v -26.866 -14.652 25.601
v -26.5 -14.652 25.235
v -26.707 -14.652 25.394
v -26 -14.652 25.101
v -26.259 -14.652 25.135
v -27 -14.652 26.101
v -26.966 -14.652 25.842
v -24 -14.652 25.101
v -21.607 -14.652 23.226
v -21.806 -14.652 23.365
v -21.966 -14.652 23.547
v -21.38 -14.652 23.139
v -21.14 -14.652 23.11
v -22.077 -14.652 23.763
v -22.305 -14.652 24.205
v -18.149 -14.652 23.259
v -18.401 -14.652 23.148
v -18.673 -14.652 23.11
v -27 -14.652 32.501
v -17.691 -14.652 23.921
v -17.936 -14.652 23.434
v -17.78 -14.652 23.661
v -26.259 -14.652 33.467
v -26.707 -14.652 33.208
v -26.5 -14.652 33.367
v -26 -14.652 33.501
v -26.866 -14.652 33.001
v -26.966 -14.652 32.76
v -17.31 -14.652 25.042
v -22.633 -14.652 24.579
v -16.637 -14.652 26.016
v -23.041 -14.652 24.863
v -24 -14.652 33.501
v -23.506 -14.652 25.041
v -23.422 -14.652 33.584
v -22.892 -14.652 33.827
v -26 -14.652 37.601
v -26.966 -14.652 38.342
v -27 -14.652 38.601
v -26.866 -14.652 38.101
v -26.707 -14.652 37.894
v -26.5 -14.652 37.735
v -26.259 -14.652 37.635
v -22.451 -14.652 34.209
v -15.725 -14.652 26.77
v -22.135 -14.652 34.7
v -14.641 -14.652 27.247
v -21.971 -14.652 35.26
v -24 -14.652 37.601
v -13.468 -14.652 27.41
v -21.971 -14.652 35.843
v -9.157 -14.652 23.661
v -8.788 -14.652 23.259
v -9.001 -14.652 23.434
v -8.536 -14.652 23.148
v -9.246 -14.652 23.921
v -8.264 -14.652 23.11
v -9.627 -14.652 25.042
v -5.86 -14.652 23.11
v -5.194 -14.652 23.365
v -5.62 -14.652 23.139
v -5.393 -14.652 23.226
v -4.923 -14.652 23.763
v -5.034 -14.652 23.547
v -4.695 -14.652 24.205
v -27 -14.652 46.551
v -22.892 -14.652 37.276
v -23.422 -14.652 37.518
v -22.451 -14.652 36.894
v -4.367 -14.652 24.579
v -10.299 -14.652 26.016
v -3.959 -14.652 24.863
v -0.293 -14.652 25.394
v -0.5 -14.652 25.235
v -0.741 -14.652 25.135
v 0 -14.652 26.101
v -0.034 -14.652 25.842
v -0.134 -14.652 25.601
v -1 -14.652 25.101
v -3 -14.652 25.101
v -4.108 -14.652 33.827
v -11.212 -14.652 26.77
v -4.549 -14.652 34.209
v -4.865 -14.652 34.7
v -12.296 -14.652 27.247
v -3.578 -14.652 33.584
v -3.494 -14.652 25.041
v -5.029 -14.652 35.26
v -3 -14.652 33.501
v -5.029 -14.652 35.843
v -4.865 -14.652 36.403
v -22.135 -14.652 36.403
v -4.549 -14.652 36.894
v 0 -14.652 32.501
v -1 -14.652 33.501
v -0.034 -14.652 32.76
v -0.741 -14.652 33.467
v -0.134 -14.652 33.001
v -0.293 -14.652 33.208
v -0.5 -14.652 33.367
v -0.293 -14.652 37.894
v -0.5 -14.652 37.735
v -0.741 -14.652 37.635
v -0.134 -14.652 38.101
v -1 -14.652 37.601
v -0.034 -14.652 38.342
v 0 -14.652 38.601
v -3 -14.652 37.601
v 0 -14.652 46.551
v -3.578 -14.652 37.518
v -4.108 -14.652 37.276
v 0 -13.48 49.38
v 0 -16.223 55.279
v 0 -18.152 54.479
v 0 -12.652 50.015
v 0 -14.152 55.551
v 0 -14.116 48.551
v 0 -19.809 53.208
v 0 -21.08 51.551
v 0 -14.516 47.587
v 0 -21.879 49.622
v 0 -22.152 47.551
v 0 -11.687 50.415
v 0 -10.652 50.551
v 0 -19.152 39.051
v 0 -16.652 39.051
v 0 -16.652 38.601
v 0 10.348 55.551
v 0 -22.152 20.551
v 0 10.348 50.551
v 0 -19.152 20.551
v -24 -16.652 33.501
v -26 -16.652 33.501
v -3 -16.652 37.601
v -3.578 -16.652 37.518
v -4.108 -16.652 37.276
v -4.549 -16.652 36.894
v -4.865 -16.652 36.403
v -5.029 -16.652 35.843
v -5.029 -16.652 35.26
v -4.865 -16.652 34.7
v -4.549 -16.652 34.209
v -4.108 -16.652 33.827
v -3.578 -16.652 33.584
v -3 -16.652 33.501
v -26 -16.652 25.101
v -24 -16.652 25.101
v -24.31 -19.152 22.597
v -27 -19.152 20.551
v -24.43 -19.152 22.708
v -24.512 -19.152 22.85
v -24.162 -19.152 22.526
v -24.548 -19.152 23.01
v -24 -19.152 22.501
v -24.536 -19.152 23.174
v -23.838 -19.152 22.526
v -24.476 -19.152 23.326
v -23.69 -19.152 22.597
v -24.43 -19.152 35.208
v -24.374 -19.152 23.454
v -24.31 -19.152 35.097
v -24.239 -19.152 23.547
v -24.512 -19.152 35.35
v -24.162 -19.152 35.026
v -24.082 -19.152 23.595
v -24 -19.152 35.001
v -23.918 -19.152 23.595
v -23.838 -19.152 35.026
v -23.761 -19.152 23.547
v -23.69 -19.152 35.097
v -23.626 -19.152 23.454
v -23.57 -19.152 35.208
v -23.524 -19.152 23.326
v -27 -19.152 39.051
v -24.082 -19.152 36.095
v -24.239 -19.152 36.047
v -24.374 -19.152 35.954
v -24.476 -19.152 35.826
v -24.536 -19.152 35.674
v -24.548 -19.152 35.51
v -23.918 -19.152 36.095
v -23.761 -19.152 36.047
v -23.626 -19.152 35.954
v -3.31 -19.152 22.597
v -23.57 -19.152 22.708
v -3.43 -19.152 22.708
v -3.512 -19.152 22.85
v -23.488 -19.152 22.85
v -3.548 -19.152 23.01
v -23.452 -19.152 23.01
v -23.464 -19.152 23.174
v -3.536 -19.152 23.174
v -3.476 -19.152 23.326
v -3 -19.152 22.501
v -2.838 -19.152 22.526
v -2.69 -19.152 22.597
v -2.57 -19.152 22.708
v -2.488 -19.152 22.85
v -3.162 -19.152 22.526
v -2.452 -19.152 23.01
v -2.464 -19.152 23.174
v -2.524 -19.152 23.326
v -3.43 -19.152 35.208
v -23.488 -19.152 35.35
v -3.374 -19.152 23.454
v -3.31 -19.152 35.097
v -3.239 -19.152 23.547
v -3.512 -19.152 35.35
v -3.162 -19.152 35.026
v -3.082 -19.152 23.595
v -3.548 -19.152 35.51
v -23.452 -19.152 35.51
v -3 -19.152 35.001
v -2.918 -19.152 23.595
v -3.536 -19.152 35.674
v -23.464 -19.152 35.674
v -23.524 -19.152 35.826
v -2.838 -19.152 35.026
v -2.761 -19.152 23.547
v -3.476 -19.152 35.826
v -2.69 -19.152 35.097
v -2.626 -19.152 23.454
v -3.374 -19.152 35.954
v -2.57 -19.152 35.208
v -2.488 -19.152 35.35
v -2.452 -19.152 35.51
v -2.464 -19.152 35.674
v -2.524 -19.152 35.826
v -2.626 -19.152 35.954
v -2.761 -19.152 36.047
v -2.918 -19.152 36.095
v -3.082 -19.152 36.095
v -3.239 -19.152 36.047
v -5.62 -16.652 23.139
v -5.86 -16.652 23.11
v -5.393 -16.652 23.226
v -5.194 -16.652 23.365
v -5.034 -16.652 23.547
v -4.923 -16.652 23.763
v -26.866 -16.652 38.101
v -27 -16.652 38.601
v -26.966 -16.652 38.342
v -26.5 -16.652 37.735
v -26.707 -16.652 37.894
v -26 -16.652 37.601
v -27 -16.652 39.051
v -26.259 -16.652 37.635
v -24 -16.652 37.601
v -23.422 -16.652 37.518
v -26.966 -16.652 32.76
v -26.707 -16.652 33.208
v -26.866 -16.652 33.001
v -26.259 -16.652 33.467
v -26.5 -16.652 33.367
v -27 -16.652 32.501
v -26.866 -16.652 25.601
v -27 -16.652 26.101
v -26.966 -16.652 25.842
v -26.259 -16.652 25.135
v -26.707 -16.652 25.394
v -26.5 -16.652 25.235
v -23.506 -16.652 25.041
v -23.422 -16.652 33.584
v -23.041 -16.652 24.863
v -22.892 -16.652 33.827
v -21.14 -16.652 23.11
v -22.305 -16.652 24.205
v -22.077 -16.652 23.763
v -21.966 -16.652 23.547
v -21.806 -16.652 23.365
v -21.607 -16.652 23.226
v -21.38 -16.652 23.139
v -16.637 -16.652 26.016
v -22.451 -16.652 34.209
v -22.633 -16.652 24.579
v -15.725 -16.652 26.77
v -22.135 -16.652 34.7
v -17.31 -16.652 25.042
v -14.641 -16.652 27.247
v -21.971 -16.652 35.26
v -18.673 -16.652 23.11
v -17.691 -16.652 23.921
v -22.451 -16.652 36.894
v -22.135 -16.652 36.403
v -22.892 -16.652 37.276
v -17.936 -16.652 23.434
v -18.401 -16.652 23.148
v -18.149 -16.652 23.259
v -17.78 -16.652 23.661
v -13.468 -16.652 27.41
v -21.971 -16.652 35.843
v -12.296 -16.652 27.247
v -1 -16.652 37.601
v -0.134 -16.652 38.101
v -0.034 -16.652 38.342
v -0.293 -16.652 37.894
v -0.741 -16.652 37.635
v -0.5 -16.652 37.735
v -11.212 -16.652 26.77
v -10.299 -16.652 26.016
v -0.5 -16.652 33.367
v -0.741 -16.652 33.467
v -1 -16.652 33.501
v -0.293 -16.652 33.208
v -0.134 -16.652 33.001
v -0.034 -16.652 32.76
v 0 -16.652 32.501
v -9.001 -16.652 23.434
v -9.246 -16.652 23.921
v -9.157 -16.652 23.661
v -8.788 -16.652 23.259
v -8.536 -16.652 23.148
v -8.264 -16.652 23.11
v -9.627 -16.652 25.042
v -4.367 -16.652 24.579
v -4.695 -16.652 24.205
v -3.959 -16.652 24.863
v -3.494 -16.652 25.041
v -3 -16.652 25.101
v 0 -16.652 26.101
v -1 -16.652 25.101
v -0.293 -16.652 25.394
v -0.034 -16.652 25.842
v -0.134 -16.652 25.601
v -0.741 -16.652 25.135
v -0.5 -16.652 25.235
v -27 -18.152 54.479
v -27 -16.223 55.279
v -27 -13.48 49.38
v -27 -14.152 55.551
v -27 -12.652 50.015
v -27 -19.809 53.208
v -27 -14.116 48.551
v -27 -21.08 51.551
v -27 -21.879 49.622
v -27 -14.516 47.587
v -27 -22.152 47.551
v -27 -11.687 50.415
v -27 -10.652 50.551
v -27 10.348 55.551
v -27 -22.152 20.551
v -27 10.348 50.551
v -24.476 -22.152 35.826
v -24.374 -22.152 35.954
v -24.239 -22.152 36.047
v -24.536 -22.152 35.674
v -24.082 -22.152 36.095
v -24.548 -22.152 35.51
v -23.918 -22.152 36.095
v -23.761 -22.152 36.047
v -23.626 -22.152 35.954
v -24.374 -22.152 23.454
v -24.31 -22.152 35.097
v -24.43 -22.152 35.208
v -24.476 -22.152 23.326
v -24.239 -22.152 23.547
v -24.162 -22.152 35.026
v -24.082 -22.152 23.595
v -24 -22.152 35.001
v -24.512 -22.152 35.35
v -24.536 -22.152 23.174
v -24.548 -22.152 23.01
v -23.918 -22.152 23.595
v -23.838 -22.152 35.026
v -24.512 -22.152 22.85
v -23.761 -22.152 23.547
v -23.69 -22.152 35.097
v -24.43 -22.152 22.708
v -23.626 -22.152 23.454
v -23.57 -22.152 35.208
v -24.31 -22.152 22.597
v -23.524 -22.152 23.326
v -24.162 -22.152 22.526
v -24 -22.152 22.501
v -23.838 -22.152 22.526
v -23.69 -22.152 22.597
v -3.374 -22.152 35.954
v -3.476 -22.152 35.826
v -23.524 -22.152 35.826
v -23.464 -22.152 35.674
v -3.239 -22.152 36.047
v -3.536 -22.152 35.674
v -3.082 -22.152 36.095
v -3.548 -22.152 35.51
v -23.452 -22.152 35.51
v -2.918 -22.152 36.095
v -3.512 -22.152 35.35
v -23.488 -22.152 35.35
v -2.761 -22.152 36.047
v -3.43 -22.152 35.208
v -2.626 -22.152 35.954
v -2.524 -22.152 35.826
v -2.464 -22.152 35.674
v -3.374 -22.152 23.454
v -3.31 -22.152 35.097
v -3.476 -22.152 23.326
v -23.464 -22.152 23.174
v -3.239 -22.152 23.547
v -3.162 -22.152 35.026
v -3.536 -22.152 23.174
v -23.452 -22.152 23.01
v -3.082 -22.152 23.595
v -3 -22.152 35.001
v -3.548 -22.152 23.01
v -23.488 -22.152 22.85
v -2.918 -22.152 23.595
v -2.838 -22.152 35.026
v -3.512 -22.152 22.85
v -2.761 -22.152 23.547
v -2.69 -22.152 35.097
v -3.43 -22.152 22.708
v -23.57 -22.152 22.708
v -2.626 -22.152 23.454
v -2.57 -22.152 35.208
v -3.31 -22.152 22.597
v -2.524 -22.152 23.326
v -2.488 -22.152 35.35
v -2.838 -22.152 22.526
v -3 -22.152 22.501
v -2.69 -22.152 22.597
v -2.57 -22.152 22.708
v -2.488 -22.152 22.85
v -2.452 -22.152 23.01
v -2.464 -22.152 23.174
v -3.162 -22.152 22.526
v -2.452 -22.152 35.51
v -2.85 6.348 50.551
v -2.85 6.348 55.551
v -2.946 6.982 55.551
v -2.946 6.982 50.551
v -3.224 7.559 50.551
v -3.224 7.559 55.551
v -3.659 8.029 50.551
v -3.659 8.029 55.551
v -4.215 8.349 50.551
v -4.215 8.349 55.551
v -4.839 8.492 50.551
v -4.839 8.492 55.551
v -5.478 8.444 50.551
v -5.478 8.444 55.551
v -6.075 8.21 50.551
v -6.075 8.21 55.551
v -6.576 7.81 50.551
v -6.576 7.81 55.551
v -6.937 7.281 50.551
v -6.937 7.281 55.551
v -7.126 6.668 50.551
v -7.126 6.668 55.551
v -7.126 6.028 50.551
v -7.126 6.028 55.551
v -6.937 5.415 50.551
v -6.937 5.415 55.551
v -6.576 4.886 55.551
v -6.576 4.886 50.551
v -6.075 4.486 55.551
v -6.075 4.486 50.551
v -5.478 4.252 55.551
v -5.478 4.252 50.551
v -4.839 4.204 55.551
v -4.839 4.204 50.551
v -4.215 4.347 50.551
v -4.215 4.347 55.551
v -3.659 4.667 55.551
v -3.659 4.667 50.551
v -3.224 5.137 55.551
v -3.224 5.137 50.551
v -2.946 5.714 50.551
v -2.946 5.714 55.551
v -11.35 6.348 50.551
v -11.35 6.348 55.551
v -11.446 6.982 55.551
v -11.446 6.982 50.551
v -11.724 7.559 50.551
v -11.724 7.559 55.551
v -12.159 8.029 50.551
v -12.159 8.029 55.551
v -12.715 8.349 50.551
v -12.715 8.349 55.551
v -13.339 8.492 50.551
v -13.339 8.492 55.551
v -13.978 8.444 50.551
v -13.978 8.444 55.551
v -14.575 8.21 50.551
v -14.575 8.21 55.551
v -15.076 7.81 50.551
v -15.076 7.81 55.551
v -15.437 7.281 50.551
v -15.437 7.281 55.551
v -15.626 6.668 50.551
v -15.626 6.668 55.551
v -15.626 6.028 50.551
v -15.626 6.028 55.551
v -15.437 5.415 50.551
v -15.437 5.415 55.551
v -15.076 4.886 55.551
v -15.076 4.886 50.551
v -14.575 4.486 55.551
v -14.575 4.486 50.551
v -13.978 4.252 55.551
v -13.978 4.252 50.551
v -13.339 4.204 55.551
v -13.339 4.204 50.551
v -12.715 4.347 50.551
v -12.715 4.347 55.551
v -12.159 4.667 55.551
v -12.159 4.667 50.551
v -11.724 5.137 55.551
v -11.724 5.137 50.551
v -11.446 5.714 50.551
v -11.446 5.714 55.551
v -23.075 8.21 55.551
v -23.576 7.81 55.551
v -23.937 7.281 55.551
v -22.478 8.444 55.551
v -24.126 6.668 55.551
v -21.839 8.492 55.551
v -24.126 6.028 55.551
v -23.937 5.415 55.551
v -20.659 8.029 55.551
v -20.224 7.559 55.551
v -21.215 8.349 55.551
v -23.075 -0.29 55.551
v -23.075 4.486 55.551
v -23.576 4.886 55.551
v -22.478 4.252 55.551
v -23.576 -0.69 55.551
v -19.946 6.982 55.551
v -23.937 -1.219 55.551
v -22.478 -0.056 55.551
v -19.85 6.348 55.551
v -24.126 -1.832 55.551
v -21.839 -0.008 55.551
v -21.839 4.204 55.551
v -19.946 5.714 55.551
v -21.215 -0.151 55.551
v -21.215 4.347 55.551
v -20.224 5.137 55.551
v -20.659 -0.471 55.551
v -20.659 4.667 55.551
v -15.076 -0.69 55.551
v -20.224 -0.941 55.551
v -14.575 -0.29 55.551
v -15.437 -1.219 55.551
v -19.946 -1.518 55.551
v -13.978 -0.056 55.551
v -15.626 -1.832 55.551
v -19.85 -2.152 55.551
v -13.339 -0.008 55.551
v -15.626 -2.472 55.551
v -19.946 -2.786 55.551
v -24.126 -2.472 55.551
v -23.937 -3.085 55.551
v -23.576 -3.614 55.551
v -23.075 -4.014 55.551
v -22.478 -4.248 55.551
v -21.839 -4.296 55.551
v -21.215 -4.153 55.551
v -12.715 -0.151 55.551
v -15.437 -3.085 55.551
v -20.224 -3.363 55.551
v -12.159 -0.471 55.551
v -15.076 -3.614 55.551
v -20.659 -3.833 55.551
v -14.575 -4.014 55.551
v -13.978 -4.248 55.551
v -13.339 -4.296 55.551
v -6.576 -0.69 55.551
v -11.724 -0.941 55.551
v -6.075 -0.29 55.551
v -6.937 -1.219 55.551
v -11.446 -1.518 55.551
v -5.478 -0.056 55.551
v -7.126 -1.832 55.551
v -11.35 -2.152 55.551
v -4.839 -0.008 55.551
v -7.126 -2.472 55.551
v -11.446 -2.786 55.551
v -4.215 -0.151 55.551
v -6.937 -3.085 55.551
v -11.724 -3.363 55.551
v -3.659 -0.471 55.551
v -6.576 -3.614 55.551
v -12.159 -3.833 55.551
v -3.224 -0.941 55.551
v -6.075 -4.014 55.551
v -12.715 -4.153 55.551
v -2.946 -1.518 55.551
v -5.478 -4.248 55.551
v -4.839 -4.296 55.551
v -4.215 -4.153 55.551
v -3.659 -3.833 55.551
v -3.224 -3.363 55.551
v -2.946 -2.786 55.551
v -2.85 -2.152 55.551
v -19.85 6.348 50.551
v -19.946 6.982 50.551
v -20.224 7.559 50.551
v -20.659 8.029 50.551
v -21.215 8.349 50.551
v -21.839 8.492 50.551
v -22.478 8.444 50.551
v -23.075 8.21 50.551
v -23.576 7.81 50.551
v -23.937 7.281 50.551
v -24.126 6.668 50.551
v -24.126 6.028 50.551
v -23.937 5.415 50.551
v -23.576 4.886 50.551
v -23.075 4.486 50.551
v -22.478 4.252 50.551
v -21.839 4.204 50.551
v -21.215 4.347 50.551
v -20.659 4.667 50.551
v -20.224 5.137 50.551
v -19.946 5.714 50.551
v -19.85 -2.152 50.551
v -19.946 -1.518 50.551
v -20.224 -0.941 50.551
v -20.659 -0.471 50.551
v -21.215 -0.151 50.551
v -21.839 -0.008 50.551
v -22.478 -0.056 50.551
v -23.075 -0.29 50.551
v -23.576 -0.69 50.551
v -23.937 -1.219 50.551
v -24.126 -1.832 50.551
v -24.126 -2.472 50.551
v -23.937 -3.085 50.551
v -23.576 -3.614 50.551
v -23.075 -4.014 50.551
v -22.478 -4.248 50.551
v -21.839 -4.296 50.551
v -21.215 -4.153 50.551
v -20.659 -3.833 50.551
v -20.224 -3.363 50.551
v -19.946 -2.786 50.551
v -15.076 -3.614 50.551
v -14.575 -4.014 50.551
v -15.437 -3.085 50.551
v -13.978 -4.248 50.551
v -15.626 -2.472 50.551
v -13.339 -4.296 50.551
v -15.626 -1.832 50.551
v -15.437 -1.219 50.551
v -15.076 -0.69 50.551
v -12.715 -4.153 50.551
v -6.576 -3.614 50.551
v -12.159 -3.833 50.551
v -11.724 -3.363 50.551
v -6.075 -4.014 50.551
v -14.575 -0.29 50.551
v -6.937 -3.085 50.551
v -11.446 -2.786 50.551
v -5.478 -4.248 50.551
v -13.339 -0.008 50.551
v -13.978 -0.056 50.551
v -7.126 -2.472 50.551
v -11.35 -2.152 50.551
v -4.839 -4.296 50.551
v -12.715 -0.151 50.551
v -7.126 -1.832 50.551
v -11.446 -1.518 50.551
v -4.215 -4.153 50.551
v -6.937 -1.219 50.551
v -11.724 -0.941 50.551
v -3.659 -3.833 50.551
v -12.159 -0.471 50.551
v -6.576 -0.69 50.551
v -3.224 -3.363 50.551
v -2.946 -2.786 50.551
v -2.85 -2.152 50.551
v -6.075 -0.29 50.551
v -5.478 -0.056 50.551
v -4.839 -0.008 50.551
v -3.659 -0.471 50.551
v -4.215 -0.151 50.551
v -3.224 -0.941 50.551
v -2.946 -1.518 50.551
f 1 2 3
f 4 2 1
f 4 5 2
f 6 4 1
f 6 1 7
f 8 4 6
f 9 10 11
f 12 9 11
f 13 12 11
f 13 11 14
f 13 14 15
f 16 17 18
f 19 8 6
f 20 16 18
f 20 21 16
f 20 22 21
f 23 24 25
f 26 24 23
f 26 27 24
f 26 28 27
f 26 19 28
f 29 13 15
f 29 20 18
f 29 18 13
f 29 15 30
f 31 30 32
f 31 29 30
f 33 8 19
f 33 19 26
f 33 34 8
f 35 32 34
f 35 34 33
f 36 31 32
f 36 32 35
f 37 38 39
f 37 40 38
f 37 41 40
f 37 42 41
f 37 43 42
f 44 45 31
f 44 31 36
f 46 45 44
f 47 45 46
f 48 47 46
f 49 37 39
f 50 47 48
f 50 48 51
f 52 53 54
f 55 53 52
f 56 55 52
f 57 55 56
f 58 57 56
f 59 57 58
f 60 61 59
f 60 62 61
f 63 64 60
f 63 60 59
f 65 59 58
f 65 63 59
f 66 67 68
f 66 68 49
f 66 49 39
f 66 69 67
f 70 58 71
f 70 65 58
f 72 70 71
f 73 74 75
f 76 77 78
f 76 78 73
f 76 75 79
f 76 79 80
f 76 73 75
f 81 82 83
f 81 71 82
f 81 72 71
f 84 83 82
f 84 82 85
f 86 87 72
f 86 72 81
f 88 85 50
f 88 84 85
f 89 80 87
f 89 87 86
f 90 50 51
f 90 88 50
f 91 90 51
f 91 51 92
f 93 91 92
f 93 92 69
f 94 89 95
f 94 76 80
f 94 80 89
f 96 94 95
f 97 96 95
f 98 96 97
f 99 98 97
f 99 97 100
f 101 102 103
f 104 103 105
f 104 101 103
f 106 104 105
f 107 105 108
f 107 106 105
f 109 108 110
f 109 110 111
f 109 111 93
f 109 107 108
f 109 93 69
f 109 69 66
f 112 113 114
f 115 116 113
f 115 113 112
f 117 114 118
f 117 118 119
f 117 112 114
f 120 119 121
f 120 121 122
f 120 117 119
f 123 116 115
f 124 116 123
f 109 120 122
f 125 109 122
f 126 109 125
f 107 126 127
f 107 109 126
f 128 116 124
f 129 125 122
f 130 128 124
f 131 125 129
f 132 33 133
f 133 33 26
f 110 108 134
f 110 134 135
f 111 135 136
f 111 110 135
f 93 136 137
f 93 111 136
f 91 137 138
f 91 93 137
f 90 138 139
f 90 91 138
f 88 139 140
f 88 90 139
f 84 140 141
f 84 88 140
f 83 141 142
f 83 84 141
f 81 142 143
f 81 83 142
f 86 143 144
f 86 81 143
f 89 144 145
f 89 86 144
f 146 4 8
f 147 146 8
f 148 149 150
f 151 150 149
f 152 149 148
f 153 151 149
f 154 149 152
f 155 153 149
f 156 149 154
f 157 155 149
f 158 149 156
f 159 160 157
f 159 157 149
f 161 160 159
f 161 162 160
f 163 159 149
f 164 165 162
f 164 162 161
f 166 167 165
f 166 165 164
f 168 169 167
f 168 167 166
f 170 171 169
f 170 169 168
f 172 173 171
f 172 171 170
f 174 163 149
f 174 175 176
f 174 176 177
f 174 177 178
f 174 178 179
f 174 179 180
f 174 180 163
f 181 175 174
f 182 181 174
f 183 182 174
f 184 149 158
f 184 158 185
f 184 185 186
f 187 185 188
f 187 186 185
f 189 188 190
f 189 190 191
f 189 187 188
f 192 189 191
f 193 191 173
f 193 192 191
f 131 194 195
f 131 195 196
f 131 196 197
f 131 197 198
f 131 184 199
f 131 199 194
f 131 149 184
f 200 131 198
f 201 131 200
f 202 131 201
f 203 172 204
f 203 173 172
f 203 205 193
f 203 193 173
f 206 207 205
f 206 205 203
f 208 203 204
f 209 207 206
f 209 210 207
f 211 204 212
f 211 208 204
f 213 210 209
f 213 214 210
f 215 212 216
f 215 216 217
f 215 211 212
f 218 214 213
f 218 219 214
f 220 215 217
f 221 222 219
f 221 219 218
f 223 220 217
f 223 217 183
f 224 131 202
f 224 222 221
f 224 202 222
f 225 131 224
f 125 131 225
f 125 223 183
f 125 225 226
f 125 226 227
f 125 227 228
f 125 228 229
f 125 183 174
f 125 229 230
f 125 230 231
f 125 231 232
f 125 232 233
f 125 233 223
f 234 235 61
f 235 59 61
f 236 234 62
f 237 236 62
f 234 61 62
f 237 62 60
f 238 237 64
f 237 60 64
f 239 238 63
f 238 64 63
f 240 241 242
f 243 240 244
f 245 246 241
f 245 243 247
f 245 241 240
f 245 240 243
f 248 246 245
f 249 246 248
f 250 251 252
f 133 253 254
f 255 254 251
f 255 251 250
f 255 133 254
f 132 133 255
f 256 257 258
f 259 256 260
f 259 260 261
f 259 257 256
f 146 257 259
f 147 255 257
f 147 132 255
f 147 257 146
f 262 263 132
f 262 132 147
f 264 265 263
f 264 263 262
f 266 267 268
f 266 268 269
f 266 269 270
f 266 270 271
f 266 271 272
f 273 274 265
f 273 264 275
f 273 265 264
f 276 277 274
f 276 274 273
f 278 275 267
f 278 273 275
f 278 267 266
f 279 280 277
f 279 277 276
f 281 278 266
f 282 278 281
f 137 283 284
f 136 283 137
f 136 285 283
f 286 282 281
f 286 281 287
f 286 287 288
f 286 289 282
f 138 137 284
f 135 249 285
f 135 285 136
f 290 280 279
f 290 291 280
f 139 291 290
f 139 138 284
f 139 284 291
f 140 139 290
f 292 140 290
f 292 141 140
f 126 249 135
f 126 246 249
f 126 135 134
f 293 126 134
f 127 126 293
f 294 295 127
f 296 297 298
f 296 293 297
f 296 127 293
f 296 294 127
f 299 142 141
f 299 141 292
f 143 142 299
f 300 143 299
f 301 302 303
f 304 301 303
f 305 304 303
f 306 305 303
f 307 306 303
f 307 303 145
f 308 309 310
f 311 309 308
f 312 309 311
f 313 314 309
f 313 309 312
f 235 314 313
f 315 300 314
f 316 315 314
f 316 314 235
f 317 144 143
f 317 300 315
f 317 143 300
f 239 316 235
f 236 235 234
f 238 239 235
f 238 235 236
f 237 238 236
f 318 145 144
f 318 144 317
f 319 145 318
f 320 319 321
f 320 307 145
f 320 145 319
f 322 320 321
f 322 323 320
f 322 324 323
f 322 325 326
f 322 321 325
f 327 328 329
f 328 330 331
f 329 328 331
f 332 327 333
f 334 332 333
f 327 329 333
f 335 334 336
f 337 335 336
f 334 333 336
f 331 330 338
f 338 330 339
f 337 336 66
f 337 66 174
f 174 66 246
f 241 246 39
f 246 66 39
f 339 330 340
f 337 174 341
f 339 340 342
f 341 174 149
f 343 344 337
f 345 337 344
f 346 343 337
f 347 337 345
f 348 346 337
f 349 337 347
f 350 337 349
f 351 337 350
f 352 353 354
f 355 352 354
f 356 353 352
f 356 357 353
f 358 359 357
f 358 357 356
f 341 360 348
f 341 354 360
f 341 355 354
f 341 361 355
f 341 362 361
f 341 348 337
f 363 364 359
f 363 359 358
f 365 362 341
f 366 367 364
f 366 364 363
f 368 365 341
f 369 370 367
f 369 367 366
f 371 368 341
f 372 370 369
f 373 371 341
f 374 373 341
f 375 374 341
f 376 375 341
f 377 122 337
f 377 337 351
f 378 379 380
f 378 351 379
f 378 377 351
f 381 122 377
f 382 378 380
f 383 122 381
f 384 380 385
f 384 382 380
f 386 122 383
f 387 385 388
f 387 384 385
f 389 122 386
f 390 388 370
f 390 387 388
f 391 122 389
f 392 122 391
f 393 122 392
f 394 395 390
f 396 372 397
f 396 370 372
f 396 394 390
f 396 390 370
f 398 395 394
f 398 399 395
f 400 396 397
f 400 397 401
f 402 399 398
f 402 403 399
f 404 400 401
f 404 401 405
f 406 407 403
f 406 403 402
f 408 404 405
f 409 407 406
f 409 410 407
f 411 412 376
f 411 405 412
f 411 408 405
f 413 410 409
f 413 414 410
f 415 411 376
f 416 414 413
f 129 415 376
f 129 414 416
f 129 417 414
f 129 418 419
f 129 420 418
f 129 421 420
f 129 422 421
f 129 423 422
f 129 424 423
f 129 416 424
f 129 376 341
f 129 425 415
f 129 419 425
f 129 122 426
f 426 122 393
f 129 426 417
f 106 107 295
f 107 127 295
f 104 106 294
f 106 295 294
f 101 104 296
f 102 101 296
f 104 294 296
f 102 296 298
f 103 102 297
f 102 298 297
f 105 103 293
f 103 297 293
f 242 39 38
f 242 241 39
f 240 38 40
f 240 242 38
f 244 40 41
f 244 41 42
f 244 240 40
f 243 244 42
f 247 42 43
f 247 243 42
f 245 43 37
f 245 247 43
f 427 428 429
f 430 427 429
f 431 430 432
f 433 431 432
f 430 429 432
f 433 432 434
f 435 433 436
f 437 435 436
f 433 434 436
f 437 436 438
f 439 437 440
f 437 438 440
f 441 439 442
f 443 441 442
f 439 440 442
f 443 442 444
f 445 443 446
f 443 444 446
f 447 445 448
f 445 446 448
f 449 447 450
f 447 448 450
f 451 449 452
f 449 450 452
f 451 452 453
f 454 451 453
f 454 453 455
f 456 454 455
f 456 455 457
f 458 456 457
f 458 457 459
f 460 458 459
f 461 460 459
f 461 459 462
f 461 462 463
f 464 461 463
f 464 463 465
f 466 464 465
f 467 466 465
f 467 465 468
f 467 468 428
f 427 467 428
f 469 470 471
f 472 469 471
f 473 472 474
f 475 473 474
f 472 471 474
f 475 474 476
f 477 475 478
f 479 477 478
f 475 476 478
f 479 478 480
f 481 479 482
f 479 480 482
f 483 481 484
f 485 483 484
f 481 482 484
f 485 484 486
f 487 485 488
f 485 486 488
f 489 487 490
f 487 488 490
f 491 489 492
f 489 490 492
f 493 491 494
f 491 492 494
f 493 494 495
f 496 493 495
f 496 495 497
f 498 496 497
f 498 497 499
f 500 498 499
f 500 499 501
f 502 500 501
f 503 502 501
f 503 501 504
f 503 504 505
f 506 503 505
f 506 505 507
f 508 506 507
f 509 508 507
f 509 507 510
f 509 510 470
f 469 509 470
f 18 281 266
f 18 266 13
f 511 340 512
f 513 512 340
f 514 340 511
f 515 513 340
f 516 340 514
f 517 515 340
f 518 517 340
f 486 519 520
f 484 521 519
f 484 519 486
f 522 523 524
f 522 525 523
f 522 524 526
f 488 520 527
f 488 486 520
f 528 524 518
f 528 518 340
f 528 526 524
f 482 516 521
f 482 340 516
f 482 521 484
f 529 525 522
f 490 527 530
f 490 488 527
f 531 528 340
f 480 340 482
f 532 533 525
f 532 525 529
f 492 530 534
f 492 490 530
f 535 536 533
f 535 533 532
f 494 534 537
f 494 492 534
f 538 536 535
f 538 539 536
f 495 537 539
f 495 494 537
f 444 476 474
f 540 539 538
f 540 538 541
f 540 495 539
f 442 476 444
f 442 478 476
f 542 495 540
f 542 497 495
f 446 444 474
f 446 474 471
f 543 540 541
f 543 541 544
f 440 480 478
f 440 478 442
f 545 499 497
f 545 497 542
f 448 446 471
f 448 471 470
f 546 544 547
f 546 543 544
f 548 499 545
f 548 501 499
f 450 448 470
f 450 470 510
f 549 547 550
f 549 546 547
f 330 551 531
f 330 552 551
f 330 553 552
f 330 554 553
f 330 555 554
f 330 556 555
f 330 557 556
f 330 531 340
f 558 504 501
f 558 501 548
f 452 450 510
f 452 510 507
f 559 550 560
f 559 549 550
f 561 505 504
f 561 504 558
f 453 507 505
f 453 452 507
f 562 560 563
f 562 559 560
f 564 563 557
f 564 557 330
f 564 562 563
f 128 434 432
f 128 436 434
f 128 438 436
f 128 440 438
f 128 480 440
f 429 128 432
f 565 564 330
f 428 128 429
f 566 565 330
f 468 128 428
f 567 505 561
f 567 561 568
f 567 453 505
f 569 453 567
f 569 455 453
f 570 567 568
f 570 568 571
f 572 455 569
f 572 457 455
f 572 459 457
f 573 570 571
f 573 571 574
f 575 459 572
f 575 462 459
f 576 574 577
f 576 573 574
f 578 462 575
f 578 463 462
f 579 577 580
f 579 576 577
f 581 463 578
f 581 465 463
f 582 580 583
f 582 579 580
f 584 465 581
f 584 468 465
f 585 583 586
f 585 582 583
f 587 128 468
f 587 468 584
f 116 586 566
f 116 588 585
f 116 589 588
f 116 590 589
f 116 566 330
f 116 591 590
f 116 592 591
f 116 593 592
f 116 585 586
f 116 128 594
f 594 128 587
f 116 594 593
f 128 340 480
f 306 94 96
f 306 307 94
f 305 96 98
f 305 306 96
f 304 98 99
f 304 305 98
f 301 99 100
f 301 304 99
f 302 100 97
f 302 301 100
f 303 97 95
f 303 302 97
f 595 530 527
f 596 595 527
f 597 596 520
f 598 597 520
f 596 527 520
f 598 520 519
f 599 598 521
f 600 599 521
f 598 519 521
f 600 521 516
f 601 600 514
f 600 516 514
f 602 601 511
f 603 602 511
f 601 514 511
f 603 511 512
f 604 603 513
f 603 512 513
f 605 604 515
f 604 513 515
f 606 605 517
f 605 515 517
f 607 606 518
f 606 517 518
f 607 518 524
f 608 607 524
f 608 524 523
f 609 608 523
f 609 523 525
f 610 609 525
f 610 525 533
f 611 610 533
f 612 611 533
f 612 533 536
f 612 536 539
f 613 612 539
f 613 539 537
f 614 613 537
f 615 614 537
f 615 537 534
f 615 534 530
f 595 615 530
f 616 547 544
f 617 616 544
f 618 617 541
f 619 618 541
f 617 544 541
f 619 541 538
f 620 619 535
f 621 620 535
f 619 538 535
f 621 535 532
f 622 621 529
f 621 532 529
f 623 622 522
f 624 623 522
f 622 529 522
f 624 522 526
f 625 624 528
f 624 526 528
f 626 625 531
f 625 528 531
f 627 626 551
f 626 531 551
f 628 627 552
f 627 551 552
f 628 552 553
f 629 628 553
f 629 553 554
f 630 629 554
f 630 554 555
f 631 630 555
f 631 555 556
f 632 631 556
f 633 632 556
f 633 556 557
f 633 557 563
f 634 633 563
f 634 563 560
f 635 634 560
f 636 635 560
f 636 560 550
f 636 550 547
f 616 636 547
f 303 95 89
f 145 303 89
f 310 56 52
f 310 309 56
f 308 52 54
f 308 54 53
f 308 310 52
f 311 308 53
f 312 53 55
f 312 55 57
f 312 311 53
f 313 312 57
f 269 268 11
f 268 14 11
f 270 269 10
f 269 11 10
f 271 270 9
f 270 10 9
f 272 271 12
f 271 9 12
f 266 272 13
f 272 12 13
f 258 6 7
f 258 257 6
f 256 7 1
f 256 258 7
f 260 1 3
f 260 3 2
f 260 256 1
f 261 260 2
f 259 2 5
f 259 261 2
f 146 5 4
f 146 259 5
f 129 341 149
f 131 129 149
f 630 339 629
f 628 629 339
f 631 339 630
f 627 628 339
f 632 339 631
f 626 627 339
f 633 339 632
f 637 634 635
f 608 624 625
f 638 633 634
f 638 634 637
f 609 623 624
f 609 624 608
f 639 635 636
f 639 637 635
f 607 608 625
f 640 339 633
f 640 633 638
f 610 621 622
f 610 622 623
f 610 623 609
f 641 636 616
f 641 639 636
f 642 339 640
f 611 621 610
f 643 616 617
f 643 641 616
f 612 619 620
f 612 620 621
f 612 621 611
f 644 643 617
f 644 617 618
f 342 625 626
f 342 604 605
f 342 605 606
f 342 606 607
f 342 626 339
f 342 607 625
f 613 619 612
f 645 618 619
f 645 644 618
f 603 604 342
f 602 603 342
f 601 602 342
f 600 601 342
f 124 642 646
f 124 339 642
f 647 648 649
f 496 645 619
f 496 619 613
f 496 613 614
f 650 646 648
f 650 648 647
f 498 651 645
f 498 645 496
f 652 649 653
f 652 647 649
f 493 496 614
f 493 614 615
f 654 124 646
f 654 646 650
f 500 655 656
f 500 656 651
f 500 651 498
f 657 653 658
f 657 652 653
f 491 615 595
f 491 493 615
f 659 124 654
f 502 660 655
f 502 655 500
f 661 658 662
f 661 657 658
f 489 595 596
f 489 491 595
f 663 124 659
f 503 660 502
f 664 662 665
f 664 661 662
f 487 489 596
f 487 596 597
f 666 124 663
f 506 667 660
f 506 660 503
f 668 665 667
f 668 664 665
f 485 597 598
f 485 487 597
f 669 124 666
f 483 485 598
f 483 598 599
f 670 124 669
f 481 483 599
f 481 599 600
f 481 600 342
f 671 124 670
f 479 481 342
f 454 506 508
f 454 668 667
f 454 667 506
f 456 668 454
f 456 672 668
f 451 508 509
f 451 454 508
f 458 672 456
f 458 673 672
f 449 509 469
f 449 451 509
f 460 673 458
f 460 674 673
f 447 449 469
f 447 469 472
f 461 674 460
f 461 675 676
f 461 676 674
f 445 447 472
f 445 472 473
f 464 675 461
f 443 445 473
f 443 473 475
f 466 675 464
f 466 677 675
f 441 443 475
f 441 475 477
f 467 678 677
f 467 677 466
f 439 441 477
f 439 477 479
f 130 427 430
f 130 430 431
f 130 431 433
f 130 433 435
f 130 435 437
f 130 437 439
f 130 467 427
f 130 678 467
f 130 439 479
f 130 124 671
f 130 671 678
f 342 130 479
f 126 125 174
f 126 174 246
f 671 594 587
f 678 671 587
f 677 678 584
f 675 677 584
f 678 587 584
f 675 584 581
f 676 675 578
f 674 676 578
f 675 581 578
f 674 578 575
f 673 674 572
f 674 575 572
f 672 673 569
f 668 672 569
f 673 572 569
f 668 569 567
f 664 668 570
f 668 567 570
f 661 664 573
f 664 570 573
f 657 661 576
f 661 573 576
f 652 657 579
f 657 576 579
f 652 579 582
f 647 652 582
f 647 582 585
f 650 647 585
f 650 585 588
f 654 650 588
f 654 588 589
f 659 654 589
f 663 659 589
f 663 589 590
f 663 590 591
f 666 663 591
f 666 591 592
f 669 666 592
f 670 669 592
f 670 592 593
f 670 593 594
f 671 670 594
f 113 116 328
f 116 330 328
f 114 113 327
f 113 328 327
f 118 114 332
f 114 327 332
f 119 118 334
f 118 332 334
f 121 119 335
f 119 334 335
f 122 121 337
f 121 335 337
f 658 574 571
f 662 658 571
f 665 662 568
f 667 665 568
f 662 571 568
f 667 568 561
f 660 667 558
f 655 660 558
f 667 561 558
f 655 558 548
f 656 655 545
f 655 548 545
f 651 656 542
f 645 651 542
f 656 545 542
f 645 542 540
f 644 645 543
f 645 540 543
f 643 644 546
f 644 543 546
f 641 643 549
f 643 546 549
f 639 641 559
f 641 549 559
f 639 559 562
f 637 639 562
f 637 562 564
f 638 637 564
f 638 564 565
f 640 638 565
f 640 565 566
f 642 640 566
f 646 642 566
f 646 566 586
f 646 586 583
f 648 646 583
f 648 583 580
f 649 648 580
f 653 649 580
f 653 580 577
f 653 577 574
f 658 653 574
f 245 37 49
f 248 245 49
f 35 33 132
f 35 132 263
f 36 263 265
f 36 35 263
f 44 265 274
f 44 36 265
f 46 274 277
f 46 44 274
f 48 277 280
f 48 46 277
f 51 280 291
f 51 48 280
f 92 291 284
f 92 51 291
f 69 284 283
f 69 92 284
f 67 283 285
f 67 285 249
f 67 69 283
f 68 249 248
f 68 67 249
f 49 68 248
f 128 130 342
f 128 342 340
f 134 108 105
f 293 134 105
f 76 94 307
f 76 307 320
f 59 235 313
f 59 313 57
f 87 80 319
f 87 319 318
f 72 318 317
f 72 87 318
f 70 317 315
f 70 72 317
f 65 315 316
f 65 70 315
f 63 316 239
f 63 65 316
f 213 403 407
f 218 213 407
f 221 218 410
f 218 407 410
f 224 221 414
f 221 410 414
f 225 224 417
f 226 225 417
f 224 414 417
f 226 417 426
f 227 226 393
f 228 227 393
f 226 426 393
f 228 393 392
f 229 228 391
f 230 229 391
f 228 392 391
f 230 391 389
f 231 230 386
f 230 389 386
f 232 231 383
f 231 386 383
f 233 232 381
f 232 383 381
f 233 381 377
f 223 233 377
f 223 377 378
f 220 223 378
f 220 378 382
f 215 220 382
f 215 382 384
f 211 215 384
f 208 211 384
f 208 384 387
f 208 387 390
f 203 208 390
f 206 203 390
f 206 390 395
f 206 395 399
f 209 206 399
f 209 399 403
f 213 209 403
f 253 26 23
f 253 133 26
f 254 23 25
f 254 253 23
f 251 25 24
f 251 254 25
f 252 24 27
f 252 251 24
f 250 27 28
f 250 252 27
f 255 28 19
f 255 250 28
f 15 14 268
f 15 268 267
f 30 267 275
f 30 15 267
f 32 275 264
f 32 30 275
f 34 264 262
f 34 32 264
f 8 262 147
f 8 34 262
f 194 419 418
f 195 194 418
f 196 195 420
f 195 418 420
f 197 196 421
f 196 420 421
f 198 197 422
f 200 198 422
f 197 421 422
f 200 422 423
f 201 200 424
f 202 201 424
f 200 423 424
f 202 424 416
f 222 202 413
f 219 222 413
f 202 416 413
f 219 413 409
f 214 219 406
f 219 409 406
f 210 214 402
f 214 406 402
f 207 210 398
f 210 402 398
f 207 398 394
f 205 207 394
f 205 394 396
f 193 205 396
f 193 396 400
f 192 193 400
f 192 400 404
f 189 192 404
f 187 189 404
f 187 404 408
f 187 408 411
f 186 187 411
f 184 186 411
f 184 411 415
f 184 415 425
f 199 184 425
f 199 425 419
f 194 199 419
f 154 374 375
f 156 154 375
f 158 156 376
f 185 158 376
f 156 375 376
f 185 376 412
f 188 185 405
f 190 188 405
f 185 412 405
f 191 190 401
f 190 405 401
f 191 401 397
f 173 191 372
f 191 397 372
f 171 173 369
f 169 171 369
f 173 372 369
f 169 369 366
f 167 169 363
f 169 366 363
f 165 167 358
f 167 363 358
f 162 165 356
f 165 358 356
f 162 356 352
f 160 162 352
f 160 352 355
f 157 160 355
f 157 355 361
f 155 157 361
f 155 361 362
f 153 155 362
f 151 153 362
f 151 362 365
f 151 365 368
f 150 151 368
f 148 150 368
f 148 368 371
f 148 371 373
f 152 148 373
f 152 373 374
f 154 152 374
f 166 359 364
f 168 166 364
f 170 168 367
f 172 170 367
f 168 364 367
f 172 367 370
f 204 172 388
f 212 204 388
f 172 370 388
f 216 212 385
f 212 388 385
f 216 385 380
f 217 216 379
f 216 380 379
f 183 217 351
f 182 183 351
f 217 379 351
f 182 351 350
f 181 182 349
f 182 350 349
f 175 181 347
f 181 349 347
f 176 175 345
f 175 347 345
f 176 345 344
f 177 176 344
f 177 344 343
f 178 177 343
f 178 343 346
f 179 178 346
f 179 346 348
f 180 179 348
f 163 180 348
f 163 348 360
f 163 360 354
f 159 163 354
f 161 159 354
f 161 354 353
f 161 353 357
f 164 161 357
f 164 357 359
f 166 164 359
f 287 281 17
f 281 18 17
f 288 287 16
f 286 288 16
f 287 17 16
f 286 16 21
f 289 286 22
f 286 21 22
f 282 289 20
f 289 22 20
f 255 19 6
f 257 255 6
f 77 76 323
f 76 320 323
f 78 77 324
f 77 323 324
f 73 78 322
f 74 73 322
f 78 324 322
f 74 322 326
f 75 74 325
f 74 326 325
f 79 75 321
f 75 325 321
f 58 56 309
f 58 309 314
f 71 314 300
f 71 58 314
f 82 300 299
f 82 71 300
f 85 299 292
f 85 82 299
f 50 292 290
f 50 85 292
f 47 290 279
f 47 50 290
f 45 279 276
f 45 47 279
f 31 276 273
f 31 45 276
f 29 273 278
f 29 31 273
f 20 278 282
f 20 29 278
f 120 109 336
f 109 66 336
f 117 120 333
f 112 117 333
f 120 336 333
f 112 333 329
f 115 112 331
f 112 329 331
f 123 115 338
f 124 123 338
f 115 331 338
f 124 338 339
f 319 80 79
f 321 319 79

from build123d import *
from OCP.BRepFilletAPI import BRepFilletAPI_MakeFillet

# Parameters (mm, degrees)
DODANIE_WYCI_GNI_CIE1_DEPTH = 27
WYTNIJ_WYCI_GNI_CIE1_REACH  = 71.794
SZKIC2_R                    = 0.55
WYTNIJ_WYCI_GNI_CIE2_START  = -7.5
SZKIC2_3_R                  = 4.3
SZKIC2_3_R_2                = 2.05
WYTNIJ_WYCI_GNI_CIE2_DEPTH  = 2
WYTNIJ_WYCI_GNI_CIE3_REACH  = 68.633
ZAOKR_GLENIE1_R             = 1
ZAOKR_GLENIE2_R1            = 8
ZAOKR_GLENIE2_R2            = 4
OTW_R_POD_RUB_M41_D         = 4.3


with BuildPart() as part:
    # Szkic1 → Dodanie-wyciągnięcie1 (new body)
    with BuildSketch(Plane(origin=(0, 0, 0), x_dir=(0, 0, -1), z_dir=(1, 0, 0))):
        Polygon((-20.551283841, -19.152030835), (-39.051283841, -19.152030835), (-39.051283841, -16.652030835), (-23.109904513, -16.652030835), (-23.109904513, -14.652030835), (-50.551283841, -14.652030835), (-50.551283841, 10.347969165), (-55.551283841, 10.347969165), (-55.551283841, -22.152030835), (-20.551283841, -22.152030835), align=None)
    extrude(amount=-DODANIE_WYCI_GNI_CIE1_DEPTH)

    # Szkic2 → Wytnij-wyciągnięcie1 (cut, up to next)
    with BuildSketch(Plane.XZ.offset(22.152030835), mode=Mode.PRIVATE) as wytnij_wyci_gni_cie1_sk1:
        with Locations(Location((-3, 23.051283841, 0), (0, 0, 270))):
            Circle(SZKIC2_R)
    wytnij_wyci_gni_cie1_tool1 = extrude(wytnij_wyci_gni_cie1_sk1.sketch, amount=-WYTNIJ_WYCI_GNI_CIE1_REACH, mode=Mode.PRIVATE) & part.part
    # Szkic2 → Wytnij-wyciągnięcie1 (cut, up to next)
    with BuildSketch(Plane.XZ.offset(22.152030835), mode=Mode.PRIVATE) as wytnij_wyci_gni_cie1_sk2:
        with Locations(Location((-3, 35.551283841, 0), (0, 0, 270))):
            Circle(SZKIC2_R)
    wytnij_wyci_gni_cie1_tool2 = extrude(wytnij_wyci_gni_cie1_sk2.sketch, amount=-WYTNIJ_WYCI_GNI_CIE1_REACH, mode=Mode.PRIVATE) & part.part
    # Szkic2 → Wytnij-wyciągnięcie1 (cut, up to next)
    with BuildSketch(Plane.XZ.offset(22.152030835), mode=Mode.PRIVATE) as wytnij_wyci_gni_cie1_sk3:
        with Locations(Location((-24, 35.551283841, 0), (0, 0, 270))):
            Circle(SZKIC2_R)
    wytnij_wyci_gni_cie1_tool3 = extrude(wytnij_wyci_gni_cie1_sk3.sketch, amount=-WYTNIJ_WYCI_GNI_CIE1_REACH, mode=Mode.PRIVATE) & part.part
    # Szkic2 → Wytnij-wyciągnięcie1 (cut, up to next)
    with BuildSketch(Plane.XZ.offset(22.152030835), mode=Mode.PRIVATE) as wytnij_wyci_gni_cie1_sk4:
        with Locations(Location((-24, 23.051283841, 0), (0, 0, 270))):
            Circle(SZKIC2_R)
    wytnij_wyci_gni_cie1_tool4 = extrude(wytnij_wyci_gni_cie1_sk4.sketch, amount=-WYTNIJ_WYCI_GNI_CIE1_REACH, mode=Mode.PRIVATE) & part.part
    add(wytnij_wyci_gni_cie1_tool1.solids().sort_by_distance((-3, -22.152031, 23.051284))[0], mode=Mode.SUBTRACT)
    add(wytnij_wyci_gni_cie1_tool2.solids().sort_by_distance((-3, -22.152031, 35.551284))[0], mode=Mode.SUBTRACT)
    add(wytnij_wyci_gni_cie1_tool3.solids().sort_by_distance((-24, -22.152031, 35.551284))[0], mode=Mode.SUBTRACT)
    add(wytnij_wyci_gni_cie1_tool4.solids().sort_by_distance((-24, -22.152031, 23.051284))[0], mode=Mode.SUBTRACT)

    # Szkic2<3> → Wytnij-wyciągnięcie2 (cut)
    with BuildSketch(Plane.XZ.offset(22.152030835).offset(WYTNIJ_WYCI_GNI_CIE2_START)):
        with Locations((-13.468476265, 23.109904513)):
            Circle(SZKIC2_3_R)
        with Locations((-3, 23.051283841)):
            Circle(SZKIC2_3_R_2)
        with Locations((-24, 23.051283841)):
            Circle(SZKIC2_3_R_2)
        with Locations(Location((-24, 35.551283841, 0), (0, 0, 270))):
            Circle(SZKIC2_3_R_2)
        with Locations(Location((-3, 35.551283841, 0), (0, 0, 270))):
            Circle(SZKIC2_3_R_2)
    extrude(amount=WYTNIJ_WYCI_GNI_CIE2_DEPTH, mode=Mode.SUBTRACT)

    # Szkic3 → Wytnij-wyciągnięcie3 (cut, up to next)
    with BuildSketch(Plane(origin=(0, -14.652030835, 0), x_dir=(1, 0, 0), z_dir=(0, 1, 0)), mode=Mode.PRIVATE) as wytnij_wyci_gni_cie3_sk1:
        with BuildLine():
            ThreePointArc((-24, -37.601283841), (-26.05, -35.551283841), (-24, -33.501283841))
            Line((-24, -33.501283841), (-27, -33.501283841))
            Line((-27, -33.501283841), (-27, -37.601283841))
            Line((-27, -37.601283841), (-24, -37.601283841))
        make_face()
    wytnij_wyci_gni_cie3_tool1 = extrude(wytnij_wyci_gni_cie3_sk1.sketch, amount=-WYTNIJ_WYCI_GNI_CIE3_REACH, mode=Mode.PRIVATE) & part.part
    # Szkic3 → Wytnij-wyciągnięcie3 (cut, up to next)
    with BuildSketch(Plane(origin=(0, -14.652030835, 0), x_dir=(1, 0, 0), z_dir=(0, 1, 0)), mode=Mode.PRIVATE) as wytnij_wyci_gni_cie3_sk2:
        with BuildLine():
            Line((-27, -23.109904513), (-27, -25.101283841))
            Line((-27, -25.101283841), (-24, -25.101283841))
            ThreePointArc((-24, -25.101283841), (-25.428693043, -24.521432197), (-26.049161686, -23.109904513))
            Line((-26.049161686, -23.109904513), (-27, -23.109904513))
        make_face()
    wytnij_wyci_gni_cie3_tool2 = extrude(wytnij_wyci_gni_cie3_sk2.sketch, amount=-WYTNIJ_WYCI_GNI_CIE3_REACH, mode=Mode.PRIVATE) & part.part
    # Szkic3 → Wytnij-wyciągnięcie3 (cut, up to next)
    with BuildSketch(Plane(origin=(0, -14.652030835, 0), x_dir=(1, 0, 0), z_dir=(0, 1, 0)), mode=Mode.PRIVATE) as wytnij_wyci_gni_cie3_sk3:
        with BuildLine():
            Line((-3, -25.101283841), (0, -25.101283841))
            Line((0, -25.101283841), (0, -23.109904513))
            Line((0, -23.109904513), (-0.950838314, -23.109904513))
            ThreePointArc((-0.950838314, -23.109904513), (-1.571306957, -24.521432197), (-3, -25.101283841))
        make_face()
    wytnij_wyci_gni_cie3_tool3 = extrude(wytnij_wyci_gni_cie3_sk3.sketch, amount=-WYTNIJ_WYCI_GNI_CIE3_REACH, mode=Mode.PRIVATE) & part.part
    # Szkic3 → Wytnij-wyciągnięcie3 (cut, up to next)
    with BuildSketch(Plane(origin=(0, -14.652030835, 0), x_dir=(1, 0, 0), z_dir=(0, 1, 0)), mode=Mode.PRIVATE) as wytnij_wyci_gni_cie3_sk4:
        with BuildLine():
            Line((0, -33.501283841), (-3, -33.501283841))
            ThreePointArc((-3, -33.501283841), (-1.550431099, -34.101714939), (-0.95, -35.551283841))
            ThreePointArc((-0.95, -35.551283841), (-1.550431099, -37.000852742), (-3, -37.601283841))
            Line((-3, -37.601283841), (0, -37.601283841))
            Line((0, -37.601283841), (0, -33.501283841))
        make_face()
    wytnij_wyci_gni_cie3_tool4 = extrude(wytnij_wyci_gni_cie3_sk4.sketch, amount=-WYTNIJ_WYCI_GNI_CIE3_REACH, mode=Mode.PRIVATE) & part.part
    add(wytnij_wyci_gni_cie3_tool1.solids().sort_by_distance((-26.229723, -14.652031, 35.551284))[0], mode=Mode.SUBTRACT)
    add(wytnij_wyci_gni_cie3_tool2.solids().sort_by_distance((-26.223837, -14.652031, 24.279211))[0], mode=Mode.SUBTRACT)
    add(wytnij_wyci_gni_cie3_tool3.solids().sort_by_distance((-0.776163, -14.652031, 24.279211))[0], mode=Mode.SUBTRACT)
    add(wytnij_wyci_gni_cie3_tool4.solids().sort_by_distance((-0.770277, -14.652031, 35.551284))[0], mode=Mode.SUBTRACT)

    # Zaokrąglenie1
    zaokr_glenie1_edges = [part.edges().sort_by_distance(p)[0] for p in [
        (-27, -15.652030835, 25.101283841),
        (-27, -15.652030835, 33.501283841),
        (-27, -15.652030835, 37.601283841),
        (-5.049161686, -15.652030835, 23.109904513),
        (-21.950838314, -15.652030835, 23.109904513),
        (-9.168476265, -15.652030835, 23.109904513),
        (-17.768476265, -15.652030835, 23.109904513),
        (0, -15.652030835, 33.501283841),
        (0, -15.652030835, 37.601283841),
        (0, -15.652030835, 25.101283841),
    ]]
    fillet(zaokr_glenie1_edges, radius=ZAOKR_GLENIE1_R)

    # Zaokrąglenie2: one fillet with a radius per group of edges: ONE call of the kernel's fillet builder (fillet() takes one radius for all edges)
    zaokr_glenie2_edges_1 = [part.edges().sort_by_distance(p)[0] for p in [
        (-13.5, -22.152030835, 55.551283841),
    ]]
    zaokr_glenie2_edges_2 = [part.edges().sort_by_distance(p)[0] for p in [
        (-13.5, -14.652030835, 50.551283841),
    ]]
    zaokr_glenie2 = BRepFilletAPI_MakeFillet(part.part.solid().wrapped)
    for e in zaokr_glenie2_edges_1:
        zaokr_glenie2.Add(ZAOKR_GLENIE2_R1, e.wrapped)
    for e in zaokr_glenie2_edges_2:
        zaokr_glenie2.Add(ZAOKR_GLENIE2_R2, e.wrapped)
    add(Compound.cast(zaokr_glenie2.Shape()), mode=Mode.REPLACE)

    # Otwór pod śrubę M41 (through all)
    with Locations(Plane(origin=(0, 0, 50.551283841), x_dir=(-1, 0, 0), z_dir=(0, 0, -1))):
        with Locations((22, -2.152030835), (13.5, -2.152030835), (5, -2.152030835), (5, 6.347969165), (13.5, 6.347969165), (22, 6.347969165)):
            Hole(OTW_R_POD_RUB_M41_D / 2)


solid = part.part
